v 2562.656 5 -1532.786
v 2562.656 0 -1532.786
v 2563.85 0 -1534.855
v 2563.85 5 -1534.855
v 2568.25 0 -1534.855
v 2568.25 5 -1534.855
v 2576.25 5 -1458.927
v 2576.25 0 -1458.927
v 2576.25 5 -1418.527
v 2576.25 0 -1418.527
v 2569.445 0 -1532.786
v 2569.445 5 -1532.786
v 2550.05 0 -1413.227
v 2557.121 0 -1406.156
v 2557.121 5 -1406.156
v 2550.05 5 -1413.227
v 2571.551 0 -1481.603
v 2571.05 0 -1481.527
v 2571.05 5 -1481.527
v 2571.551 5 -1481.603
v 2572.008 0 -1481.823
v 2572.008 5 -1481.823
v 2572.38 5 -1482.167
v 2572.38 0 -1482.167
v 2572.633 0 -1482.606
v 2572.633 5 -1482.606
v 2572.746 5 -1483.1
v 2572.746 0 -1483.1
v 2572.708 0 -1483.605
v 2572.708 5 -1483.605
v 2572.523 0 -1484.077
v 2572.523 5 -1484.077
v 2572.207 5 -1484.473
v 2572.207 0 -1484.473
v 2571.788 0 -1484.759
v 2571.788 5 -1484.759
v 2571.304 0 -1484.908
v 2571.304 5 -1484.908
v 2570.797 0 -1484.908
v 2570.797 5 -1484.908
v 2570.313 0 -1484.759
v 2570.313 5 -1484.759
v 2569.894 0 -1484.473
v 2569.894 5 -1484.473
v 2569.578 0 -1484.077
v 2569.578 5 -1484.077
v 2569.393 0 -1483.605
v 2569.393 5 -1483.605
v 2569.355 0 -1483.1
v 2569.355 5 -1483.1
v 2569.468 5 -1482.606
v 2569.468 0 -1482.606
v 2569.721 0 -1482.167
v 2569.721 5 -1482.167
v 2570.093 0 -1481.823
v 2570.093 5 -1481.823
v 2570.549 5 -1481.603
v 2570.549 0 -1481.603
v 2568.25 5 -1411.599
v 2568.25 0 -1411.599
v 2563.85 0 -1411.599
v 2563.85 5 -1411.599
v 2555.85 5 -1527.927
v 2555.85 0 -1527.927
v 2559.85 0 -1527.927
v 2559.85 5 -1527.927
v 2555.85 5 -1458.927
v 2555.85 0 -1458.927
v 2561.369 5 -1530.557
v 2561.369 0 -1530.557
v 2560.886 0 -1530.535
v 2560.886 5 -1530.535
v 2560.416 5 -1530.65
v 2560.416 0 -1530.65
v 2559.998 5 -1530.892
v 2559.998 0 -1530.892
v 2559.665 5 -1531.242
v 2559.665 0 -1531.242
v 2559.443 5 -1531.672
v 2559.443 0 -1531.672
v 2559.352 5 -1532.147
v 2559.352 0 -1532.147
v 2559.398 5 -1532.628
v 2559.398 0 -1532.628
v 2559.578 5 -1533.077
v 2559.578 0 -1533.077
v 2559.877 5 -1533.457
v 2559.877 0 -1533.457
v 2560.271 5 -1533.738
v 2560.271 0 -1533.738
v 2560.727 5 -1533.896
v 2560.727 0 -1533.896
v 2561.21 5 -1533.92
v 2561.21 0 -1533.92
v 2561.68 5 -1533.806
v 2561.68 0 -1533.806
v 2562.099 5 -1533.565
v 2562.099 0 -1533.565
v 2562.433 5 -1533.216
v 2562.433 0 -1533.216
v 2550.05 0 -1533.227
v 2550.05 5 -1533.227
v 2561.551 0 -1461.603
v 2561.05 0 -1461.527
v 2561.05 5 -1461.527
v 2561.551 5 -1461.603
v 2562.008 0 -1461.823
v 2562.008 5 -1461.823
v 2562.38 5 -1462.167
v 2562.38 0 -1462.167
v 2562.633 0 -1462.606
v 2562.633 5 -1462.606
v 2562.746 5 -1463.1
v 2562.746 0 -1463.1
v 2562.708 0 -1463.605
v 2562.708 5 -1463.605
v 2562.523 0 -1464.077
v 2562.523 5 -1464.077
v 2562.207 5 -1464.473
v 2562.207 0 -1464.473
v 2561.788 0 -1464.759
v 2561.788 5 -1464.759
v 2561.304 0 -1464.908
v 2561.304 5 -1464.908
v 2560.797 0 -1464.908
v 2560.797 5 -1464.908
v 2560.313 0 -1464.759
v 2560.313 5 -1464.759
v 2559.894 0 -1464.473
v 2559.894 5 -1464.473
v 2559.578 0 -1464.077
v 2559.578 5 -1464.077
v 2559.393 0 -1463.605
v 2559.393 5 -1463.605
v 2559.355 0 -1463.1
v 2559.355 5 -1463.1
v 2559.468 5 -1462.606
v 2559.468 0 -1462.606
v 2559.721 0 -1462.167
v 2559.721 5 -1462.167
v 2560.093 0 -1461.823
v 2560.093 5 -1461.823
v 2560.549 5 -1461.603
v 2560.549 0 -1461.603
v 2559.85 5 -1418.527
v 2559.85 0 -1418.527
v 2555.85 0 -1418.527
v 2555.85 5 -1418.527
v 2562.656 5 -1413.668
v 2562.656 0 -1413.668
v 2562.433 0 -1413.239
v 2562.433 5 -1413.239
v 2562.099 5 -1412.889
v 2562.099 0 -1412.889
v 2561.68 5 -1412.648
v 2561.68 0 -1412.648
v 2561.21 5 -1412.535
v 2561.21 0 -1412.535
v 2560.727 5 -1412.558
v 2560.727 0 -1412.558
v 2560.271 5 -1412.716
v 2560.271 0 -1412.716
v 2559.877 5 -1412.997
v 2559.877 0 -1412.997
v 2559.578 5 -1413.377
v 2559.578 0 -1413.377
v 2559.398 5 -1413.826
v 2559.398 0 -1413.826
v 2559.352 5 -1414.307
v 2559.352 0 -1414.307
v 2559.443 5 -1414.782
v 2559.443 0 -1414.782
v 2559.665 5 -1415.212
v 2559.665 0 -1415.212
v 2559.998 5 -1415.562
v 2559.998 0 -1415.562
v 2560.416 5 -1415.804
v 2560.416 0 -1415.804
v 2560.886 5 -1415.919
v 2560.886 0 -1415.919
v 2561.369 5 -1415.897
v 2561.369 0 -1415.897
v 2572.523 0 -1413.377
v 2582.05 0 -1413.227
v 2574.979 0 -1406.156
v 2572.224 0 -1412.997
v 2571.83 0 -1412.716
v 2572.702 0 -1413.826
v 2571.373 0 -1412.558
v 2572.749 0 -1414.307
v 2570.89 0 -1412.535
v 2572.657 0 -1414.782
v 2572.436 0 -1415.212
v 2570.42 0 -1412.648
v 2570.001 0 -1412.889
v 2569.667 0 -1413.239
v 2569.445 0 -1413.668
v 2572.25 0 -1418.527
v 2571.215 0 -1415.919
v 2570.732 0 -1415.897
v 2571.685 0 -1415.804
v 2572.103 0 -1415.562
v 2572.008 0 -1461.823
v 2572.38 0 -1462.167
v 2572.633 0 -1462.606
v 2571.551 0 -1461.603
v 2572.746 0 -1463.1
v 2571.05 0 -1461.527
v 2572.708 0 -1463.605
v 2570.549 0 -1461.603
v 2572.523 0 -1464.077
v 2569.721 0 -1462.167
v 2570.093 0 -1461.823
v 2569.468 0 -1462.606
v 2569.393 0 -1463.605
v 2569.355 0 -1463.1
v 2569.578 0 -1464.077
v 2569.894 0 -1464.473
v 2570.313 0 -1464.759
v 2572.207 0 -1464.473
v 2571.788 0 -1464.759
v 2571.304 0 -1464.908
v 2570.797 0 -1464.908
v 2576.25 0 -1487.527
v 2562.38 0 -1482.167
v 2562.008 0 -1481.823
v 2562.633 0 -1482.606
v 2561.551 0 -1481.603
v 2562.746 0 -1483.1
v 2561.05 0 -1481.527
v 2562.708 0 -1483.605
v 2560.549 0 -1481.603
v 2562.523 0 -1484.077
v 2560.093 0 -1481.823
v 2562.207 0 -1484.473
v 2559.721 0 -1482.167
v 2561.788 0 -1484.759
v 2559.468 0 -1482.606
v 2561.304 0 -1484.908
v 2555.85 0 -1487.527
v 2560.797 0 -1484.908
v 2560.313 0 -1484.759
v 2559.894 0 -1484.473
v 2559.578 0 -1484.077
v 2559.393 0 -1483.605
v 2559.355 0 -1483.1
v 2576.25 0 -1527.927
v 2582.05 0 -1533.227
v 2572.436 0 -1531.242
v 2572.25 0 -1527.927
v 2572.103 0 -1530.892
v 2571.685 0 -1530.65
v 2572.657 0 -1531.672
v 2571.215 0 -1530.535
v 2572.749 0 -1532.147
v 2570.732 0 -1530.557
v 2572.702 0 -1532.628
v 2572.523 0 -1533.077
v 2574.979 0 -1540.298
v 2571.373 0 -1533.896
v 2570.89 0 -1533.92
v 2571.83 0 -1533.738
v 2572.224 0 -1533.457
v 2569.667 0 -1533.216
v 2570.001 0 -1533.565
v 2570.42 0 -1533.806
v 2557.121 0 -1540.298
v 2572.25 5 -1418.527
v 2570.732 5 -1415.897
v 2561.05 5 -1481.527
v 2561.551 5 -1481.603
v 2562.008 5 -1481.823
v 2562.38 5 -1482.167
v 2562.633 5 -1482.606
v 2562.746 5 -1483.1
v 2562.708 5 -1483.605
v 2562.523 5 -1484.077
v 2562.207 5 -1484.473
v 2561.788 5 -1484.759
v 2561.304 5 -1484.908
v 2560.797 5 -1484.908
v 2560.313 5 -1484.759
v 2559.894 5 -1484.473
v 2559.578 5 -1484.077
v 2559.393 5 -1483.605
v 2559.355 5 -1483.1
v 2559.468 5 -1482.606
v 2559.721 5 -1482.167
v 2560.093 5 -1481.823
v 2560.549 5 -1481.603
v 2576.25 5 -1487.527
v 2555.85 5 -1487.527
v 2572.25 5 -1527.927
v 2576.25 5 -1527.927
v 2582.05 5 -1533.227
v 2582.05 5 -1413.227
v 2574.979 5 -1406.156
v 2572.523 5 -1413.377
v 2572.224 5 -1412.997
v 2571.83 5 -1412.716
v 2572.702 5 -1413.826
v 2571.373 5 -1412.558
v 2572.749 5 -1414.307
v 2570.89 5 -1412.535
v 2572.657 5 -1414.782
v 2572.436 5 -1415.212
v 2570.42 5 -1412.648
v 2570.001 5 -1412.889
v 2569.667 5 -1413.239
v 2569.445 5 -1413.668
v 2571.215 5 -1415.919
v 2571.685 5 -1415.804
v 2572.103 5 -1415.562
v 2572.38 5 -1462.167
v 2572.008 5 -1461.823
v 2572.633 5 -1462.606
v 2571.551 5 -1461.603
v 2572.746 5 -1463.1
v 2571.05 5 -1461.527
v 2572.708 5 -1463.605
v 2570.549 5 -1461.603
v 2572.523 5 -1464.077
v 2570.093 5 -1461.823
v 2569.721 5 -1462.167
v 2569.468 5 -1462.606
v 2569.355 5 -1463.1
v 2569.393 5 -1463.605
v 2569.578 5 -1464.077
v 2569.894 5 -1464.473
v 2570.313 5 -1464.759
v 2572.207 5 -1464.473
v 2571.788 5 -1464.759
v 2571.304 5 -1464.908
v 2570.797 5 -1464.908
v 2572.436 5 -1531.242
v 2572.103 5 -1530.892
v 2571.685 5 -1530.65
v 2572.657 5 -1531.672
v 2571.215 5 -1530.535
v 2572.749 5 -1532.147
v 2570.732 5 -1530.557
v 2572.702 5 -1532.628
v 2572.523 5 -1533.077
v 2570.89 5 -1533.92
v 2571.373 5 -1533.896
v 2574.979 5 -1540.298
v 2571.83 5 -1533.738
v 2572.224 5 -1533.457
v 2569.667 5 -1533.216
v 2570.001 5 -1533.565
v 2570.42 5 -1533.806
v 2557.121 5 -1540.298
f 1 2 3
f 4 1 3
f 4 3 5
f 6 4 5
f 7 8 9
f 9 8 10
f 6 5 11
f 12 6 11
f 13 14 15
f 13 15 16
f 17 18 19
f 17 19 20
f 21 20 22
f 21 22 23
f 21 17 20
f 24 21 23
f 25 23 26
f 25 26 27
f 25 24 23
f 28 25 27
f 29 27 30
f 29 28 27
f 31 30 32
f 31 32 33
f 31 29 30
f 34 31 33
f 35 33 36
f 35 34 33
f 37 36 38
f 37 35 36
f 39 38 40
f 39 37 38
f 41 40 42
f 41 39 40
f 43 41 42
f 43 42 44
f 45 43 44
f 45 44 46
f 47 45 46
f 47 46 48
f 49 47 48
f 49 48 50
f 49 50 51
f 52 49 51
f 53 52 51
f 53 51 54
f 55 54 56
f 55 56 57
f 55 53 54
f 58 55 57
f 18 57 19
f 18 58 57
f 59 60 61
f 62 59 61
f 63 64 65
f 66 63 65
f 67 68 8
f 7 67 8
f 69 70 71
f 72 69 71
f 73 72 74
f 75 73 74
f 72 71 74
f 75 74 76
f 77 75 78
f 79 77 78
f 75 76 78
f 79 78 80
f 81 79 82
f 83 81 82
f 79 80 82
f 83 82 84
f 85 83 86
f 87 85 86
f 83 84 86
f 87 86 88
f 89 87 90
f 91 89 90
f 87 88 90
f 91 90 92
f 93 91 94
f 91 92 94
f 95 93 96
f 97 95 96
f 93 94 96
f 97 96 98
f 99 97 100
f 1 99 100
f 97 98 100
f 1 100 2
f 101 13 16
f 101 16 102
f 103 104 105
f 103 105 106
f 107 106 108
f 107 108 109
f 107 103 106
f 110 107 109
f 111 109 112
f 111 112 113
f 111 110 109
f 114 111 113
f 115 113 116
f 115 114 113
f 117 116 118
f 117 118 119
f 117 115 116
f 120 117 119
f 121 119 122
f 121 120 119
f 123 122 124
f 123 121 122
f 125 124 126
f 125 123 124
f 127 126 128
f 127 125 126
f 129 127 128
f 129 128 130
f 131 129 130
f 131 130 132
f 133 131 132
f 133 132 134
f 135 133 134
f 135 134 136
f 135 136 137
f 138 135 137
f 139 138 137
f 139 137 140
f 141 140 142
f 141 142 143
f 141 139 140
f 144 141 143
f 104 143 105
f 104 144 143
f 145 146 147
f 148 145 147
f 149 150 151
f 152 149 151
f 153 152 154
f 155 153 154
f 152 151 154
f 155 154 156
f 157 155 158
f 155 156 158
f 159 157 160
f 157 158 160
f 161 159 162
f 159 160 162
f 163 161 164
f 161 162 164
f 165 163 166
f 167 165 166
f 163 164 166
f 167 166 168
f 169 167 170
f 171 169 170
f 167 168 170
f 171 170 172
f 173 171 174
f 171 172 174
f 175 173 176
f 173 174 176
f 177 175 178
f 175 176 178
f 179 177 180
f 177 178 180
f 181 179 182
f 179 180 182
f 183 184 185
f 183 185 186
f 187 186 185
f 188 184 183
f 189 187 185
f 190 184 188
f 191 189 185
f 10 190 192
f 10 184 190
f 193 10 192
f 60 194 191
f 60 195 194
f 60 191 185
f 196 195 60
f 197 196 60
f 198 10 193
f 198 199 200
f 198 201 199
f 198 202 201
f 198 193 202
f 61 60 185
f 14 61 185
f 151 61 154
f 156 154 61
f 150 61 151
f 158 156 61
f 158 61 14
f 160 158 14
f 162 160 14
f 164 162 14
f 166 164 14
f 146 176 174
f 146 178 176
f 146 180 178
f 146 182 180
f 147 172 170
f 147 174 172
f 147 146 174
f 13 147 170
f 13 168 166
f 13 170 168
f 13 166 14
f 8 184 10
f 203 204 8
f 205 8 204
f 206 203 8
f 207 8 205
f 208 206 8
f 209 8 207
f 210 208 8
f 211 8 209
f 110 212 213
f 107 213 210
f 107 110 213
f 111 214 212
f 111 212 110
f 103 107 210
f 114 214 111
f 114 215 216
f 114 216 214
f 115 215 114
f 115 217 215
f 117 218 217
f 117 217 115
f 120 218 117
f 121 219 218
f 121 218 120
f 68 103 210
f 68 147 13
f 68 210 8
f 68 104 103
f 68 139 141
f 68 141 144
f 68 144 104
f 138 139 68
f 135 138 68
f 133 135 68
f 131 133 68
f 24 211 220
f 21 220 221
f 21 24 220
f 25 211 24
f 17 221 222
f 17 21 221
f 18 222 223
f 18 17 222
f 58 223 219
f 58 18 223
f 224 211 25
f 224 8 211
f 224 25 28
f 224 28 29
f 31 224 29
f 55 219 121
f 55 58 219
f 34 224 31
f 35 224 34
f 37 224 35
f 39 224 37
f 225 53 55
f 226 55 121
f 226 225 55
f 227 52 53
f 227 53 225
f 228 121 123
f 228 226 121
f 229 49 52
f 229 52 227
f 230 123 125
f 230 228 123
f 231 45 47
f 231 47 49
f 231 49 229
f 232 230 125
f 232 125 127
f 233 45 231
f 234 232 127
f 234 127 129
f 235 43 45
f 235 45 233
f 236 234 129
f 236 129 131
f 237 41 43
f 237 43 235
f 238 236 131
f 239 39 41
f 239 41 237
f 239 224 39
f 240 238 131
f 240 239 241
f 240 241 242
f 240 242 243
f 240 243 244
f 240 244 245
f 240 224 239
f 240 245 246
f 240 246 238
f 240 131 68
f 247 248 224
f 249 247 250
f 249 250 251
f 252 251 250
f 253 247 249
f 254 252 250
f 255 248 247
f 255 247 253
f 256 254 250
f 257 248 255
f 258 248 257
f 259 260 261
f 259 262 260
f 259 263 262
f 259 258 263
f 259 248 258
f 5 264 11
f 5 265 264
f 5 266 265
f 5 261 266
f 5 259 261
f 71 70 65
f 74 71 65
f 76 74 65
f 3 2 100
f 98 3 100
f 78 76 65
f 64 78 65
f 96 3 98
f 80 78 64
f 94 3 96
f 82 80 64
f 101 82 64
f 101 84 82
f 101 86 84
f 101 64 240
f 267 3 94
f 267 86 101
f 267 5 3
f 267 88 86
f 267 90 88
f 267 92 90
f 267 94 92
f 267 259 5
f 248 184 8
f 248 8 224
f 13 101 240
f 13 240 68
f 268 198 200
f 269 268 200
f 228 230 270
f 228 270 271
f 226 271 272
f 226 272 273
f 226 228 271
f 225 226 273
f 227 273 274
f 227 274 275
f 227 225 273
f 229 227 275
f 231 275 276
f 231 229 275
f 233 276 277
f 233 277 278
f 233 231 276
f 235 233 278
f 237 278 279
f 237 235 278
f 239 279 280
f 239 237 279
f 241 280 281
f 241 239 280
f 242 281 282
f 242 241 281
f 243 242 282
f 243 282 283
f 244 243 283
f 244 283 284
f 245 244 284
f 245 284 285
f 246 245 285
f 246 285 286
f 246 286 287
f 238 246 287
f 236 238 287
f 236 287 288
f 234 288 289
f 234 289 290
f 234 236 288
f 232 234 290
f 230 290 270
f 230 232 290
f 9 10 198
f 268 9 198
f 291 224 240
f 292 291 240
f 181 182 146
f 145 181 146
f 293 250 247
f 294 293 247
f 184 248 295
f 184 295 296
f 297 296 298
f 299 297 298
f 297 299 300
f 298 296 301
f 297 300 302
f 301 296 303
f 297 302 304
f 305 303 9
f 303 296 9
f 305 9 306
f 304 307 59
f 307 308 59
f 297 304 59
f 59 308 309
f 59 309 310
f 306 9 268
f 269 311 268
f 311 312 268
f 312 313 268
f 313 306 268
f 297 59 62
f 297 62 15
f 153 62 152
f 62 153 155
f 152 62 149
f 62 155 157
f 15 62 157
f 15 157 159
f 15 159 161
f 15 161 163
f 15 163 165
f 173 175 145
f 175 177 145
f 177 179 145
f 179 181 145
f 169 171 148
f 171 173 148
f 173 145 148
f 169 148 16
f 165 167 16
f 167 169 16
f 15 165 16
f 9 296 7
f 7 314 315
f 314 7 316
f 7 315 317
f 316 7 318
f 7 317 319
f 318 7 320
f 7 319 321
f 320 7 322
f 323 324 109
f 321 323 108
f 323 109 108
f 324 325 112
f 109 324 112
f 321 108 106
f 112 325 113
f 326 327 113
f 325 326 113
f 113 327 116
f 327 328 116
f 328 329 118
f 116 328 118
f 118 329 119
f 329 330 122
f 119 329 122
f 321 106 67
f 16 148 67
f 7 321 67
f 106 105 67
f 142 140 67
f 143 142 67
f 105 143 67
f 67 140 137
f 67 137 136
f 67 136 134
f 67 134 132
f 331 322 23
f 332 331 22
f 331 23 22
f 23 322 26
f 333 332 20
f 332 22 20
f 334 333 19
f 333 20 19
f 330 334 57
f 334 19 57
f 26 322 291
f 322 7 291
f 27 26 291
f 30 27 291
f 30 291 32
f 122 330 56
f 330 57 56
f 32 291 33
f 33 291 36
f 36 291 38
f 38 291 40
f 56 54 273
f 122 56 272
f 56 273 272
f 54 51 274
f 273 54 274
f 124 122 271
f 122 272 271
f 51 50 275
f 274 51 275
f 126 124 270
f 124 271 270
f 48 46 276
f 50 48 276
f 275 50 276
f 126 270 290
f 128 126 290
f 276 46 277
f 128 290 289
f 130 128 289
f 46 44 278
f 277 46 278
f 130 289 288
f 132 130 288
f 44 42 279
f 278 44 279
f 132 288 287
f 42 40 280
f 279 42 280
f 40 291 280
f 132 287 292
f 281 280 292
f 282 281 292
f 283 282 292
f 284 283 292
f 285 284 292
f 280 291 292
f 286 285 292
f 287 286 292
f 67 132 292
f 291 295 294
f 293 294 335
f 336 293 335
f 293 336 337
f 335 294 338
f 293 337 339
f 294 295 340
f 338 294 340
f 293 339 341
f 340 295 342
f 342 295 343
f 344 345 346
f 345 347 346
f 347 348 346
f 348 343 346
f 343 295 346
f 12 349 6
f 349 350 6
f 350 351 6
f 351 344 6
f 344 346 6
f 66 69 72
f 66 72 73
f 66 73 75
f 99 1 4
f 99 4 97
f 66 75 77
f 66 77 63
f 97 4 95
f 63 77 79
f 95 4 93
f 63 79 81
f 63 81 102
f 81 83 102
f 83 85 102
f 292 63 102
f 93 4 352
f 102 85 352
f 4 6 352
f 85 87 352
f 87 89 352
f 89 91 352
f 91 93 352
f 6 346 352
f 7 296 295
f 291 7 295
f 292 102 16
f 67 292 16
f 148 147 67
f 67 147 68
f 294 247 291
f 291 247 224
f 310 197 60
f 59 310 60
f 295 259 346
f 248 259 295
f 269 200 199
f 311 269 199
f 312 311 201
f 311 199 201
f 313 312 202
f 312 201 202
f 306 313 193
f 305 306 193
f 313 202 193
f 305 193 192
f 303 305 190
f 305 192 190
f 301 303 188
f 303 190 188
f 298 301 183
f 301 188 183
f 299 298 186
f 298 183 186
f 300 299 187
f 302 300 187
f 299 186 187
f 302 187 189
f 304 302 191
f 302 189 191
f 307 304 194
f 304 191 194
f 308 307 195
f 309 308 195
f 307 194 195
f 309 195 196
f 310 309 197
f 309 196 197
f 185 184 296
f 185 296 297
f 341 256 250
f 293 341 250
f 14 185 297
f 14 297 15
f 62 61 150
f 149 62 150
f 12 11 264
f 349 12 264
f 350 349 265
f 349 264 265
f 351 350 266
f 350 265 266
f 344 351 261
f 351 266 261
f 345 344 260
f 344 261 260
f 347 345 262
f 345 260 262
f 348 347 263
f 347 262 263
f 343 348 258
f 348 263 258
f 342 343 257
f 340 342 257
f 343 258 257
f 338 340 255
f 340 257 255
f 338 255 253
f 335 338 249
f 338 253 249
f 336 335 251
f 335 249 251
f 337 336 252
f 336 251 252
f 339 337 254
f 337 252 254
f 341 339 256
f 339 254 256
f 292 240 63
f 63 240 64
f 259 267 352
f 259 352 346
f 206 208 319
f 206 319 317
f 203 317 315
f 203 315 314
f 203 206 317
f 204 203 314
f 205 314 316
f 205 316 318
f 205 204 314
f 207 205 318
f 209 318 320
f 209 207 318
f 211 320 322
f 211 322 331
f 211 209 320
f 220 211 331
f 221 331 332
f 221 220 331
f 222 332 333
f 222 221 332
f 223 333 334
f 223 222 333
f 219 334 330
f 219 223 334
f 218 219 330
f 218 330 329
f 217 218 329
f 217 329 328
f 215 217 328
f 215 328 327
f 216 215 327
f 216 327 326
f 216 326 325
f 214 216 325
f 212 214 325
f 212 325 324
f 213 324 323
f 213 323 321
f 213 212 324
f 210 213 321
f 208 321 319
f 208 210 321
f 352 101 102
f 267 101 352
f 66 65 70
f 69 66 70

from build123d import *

# Parameters (mm, degrees)
SKETCH_1_R      = 1.7
EXTRUDE_1_DEPTH = 5


with BuildPart() as part:
    # 草图1 → 凸台-拉伸1 (new body)
    with BuildSketch(Plane(origin=(0, 0, 0), x_dir=(1, 0, 0), z_dir=(0, 1, 0))):
        Polygon((2550.050393087, 1533.227125386), (2557.121460899, 1540.298193198), (2574.979325275, 1540.298193198), (2582.050393087, 1533.227125386), (2582.050393087, 1413.227125386), (2574.979325275, 1406.156057575), (2557.121460899, 1406.156057575), (2550.050393087, 1413.227125386), align=None)
        with Locations(Location((2571.050393087, 1483.227125386, 0), (0, 0, 270))):
            Circle(SKETCH_1_R, mode=Mode.SUBTRACT)
        with Locations(Location((2561.050393087, 1483.227125386, 0), (0, 0, 270))):
            Circle(SKETCH_1_R, mode=Mode.SUBTRACT)
        with Locations(Location((2561.050393087, 1463.227125386, 0), (0, 0, 270))):
            Circle(SKETCH_1_R, mode=Mode.SUBTRACT)
        with Locations(Location((2571.050393087, 1463.227125386, 0), (0, 0, 270))):
            Circle(SKETCH_1_R, mode=Mode.SUBTRACT)
        with BuildLine():
            Line((2576.250393087, 1487.527125386), (2555.850393087, 1487.527125386))
            Line((2555.850393087, 1487.527125386), (2555.850393087, 1527.927125386))
            Line((2555.850393087, 1527.927125386), (2559.850393087, 1527.927125386))
            Line((2559.850393087, 1527.927125386), (2561.368882267, 1530.557225796))
            ThreePointArc((2561.368882267, 1530.557225796), (2559.578149901, 1533.077125386), (2562.655813144, 1532.786255462))
            Line((2562.655813144, 1532.786255462), (2563.850393087, 1534.855328617))
            Line((2563.850393087, 1534.855328617), (2568.250393087, 1534.855328617))
            Line((2568.250393087, 1534.855328617), (2569.44497303, 1532.786255462))
            ThreePointArc((2569.44497303, 1532.786255462), (2572.522636274, 1533.077125386), (2570.731903908, 1530.557225796))
            Line((2570.731903908, 1530.557225796), (2572.250393087, 1527.927125386))
            Line((2572.250393087, 1527.927125386), (2576.250393087, 1527.927125386))
            Line((2576.250393087, 1527.927125386), (2576.250393087, 1487.527125386))
        make_face(mode=Mode.SUBTRACT)
        with BuildLine():
            Line((2555.850393087, 1458.927125386), (2576.250393087, 1458.927125386))
            Line((2576.250393087, 1458.927125386), (2576.250393087, 1418.527125386))
            Line((2576.250393087, 1418.527125386), (2572.250393087, 1418.527125386))
            Line((2572.250393087, 1418.527125386), (2570.731903908, 1415.897024977))
            ThreePointArc((2570.731903908, 1415.897024977), (2572.522636274, 1413.377125386), (2569.44497303, 1413.667995311))
            Line((2569.44497303, 1413.667995311), (2568.250393087, 1411.598922156))
            Line((2568.250393087, 1411.598922156), (2563.850393087, 1411.598922156))
            Line((2563.850393087, 1411.598922156), (2562.655813144, 1413.667995311))
            ThreePointArc((2562.655813144, 1413.667995311), (2559.578149901, 1413.377125386), (2561.368882267, 1415.897024977))
            Line((2561.368882267, 1415.897024977), (2559.850393087, 1418.527125386))
            Line((2559.850393087, 1418.527125386), (2555.850393087, 1418.527125386))
            Line((2555.850393087, 1418.527125386), (2555.850393087, 1458.927125386))
        make_face(mode=Mode.SUBTRACT)
    extrude(amount=EXTRUDE_1_DEPTH)


solid = part.part
